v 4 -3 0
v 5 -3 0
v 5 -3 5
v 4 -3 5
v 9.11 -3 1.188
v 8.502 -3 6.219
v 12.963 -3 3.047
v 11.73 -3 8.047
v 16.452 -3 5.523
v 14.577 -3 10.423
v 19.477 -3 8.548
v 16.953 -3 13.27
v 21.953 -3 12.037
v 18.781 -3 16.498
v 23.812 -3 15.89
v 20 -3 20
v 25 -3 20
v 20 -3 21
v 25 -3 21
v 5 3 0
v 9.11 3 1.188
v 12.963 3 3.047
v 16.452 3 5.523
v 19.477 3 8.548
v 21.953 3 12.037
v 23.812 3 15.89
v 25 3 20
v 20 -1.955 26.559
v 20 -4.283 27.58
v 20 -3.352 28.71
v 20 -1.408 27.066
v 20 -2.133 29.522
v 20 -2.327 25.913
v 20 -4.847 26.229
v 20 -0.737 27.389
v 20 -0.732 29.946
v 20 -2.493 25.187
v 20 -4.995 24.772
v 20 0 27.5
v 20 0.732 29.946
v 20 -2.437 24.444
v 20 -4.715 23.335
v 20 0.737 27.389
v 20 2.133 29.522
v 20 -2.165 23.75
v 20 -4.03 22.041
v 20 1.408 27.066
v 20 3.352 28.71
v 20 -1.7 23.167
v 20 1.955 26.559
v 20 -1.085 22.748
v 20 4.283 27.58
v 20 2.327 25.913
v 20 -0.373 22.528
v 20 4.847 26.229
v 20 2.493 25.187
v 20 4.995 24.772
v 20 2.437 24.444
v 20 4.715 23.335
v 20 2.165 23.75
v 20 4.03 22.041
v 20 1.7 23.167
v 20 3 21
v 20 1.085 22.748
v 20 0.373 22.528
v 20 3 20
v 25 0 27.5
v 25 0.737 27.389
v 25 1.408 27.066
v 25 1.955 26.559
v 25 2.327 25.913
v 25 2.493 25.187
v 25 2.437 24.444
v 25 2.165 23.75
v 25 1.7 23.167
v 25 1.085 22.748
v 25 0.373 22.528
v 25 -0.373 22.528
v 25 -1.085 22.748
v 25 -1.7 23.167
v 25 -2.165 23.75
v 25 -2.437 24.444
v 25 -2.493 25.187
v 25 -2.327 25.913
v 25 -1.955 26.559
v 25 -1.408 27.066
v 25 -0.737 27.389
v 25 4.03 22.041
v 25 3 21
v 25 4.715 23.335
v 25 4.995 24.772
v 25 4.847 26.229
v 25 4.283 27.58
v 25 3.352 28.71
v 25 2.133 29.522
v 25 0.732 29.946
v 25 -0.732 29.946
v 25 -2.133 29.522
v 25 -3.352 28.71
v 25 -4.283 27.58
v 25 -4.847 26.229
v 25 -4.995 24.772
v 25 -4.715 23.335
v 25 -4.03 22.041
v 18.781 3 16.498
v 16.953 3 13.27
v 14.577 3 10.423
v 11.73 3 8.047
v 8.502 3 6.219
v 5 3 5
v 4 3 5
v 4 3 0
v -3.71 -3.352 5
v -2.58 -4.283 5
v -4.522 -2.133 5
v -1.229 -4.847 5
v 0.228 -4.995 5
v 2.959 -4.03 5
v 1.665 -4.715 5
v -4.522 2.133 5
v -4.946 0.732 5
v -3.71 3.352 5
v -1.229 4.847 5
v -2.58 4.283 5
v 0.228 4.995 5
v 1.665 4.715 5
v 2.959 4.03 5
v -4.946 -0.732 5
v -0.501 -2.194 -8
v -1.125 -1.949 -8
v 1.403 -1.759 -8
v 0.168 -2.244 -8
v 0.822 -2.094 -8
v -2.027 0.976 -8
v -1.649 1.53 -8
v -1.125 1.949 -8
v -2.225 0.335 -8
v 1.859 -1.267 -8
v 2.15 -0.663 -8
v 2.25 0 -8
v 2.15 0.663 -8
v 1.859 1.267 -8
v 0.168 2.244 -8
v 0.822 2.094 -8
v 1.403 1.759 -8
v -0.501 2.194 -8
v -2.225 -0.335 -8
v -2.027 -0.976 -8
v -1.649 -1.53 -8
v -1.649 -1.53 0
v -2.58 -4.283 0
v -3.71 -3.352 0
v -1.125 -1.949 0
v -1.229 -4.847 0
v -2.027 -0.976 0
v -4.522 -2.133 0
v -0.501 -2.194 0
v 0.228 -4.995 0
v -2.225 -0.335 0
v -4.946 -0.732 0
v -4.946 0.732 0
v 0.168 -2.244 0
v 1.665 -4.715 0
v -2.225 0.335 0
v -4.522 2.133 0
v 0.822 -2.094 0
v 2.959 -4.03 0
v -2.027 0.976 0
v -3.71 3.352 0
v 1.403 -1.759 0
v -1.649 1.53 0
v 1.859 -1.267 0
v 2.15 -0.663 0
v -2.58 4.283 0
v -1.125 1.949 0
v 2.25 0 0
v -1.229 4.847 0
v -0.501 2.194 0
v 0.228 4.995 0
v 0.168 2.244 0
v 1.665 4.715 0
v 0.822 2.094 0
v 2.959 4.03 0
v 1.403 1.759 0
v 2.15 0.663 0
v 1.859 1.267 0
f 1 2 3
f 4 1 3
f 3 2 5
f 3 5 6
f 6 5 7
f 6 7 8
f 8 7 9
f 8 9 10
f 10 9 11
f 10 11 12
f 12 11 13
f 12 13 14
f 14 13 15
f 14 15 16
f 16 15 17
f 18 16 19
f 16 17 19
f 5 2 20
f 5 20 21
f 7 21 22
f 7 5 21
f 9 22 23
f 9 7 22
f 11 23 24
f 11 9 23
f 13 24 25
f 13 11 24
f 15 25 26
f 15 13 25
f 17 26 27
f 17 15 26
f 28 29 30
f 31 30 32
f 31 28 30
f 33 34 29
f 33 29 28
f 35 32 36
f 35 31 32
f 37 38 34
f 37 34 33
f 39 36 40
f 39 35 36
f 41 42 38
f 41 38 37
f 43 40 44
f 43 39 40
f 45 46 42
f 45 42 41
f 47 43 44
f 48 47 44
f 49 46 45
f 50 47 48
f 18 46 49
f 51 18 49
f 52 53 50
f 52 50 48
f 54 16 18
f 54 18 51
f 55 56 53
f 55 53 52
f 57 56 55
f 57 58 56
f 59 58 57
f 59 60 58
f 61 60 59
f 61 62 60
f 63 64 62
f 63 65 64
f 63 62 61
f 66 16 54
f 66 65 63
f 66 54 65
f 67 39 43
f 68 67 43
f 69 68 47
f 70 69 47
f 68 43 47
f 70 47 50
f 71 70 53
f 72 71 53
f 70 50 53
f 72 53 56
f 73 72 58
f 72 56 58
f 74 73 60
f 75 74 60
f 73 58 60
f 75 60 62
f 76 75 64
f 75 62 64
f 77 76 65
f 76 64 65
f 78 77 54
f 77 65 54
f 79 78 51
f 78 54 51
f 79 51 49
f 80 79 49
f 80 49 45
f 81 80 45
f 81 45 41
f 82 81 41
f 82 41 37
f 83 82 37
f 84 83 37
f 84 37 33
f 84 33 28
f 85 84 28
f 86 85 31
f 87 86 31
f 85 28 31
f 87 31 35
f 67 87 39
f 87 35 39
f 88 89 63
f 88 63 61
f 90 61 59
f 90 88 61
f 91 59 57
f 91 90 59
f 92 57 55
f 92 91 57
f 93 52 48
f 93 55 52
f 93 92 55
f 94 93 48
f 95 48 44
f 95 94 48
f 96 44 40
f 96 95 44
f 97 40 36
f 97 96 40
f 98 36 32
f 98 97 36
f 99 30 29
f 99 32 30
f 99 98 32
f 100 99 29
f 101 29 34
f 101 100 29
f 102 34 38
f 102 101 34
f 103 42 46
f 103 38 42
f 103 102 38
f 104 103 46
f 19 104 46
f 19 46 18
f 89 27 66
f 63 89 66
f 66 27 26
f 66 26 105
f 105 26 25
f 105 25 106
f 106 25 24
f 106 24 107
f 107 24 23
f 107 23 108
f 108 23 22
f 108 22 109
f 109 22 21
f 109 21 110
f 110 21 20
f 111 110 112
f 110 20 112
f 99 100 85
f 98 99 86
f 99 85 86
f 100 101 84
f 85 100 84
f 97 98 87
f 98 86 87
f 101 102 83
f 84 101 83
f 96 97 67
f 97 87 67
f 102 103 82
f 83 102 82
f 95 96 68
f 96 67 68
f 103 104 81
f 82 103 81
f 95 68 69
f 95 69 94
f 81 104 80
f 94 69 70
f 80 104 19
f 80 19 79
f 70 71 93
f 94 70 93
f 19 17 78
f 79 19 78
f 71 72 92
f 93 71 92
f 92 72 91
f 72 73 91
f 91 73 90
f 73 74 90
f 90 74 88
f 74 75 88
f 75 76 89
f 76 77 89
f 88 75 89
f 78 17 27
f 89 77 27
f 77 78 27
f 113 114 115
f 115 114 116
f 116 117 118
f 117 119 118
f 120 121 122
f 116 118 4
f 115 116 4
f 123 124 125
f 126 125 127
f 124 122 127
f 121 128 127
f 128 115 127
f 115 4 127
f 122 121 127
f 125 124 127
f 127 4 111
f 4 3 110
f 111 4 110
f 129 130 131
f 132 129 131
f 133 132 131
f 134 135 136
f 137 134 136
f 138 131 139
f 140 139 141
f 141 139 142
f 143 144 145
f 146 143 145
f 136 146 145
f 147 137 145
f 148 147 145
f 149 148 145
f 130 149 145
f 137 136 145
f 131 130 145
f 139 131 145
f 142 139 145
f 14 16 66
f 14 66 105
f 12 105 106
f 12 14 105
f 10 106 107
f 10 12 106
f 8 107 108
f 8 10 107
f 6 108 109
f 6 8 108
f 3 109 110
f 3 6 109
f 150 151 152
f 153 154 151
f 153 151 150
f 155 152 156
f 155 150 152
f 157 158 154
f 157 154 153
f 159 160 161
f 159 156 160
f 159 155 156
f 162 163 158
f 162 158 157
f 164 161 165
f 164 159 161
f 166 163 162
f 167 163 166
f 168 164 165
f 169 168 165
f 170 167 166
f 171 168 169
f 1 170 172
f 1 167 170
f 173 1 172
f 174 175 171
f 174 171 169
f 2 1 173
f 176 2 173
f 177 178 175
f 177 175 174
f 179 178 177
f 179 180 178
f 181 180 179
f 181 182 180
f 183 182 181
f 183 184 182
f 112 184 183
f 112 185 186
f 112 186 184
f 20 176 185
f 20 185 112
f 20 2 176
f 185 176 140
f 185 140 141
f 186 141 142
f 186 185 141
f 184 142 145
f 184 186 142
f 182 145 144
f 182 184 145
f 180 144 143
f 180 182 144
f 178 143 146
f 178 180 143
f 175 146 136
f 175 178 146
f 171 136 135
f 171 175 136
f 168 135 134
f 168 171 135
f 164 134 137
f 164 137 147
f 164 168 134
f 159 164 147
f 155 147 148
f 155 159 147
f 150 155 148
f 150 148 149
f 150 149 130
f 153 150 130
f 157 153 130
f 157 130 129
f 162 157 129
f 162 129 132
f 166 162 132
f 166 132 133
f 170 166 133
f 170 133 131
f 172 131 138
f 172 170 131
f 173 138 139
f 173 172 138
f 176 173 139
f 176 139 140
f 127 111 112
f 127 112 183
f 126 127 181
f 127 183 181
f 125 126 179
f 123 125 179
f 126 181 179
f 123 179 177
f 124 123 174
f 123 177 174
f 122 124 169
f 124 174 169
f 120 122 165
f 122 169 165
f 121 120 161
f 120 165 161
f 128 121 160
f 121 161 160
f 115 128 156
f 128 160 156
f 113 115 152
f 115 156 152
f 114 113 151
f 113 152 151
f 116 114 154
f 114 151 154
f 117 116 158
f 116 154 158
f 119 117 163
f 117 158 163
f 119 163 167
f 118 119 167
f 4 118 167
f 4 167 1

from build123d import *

# Parameters (mm, degrees)
SKETCH_2_R           = 5
EXTRUDE_3_DEPTH      = 5
EXTRUDE_4_DEPTH      = 3
EXTRUDE_4_DEPTH_BACK = 3
SKETCH_3_3_W         = 5
SKETCH_3_3_H         = 5
SKETCH_4_W           = 5
SKETCH_4_H           = 6
EXTRUDE_5_DEPTH      = 3
SKETCH_5_W           = 5
SKETCH_5_H           = 6
EXTRUDE_6_DEPTH      = 3
SKETCH_6_R           = 2.5
CUT_EXTRUDE_1_DEPTH  = 5
EXTRUDE_START        = -5
SKETCH_7_R           = 2.25
EXTRUDE_7_DEPTH      = 8


with BuildPart() as part:
    # 草图2 → 凸台-拉伸3 (new body)
    with BuildSketch(Plane.XY):
        Circle(SKETCH_2_R)
    extrude(amount=EXTRUDE_3_DEPTH)



with BuildPart() as body_2:
    # 草图3 → 凸台-拉伸4 (new, two sides: drawn at the far end of the back side and taken through both)
    with BuildSketch(Plane(origin=(0, 0, 0), x_dir=(1, 0, 0), z_dir=(0, 1, 0)).offset(-EXTRUDE_4_DEPTH_BACK)):
        with BuildLine():
            ThreePointArc((5, 0), (18.027756377, -6.972243623), (25, -20))
            Line((25, -20), (20, -20))
            ThreePointArc((20, -20), (14.577379737, -10.422620263), (5, -5))
            Line((5, -5), (5, 0))
        make_face()
    extrude(amount=EXTRUDE_4_DEPTH + EXTRUDE_4_DEPTH_BACK)



with BuildPart() as body_3:
    # 草图3<3> → 旋转1 (revolve)
    with BuildSketch(Plane(origin=(0, 0, 0), x_dir=(1, 0, 0), z_dir=(0, 1, 0)), mode=Mode.PRIVATE) as revolve_1_sk:
        with Locations((22.5, -22.5)):
            Rectangle(SKETCH_3_3_W, SKETCH_3_3_H)
    revolve(revolve_1_sk.sketch.rotate(Axis((0, 0, 25), (1, 0, 0)), 180), axis=Axis((0, 0, 25), (1, 0, 0)))


with BuildPart() as body_2_1:
    add(body_2.part)

    add(body_3.part)  # 凸台-拉伸5 merges body 3
    # 草图4 → 凸台-拉伸5 (add)
    with BuildSketch(Plane.XY.offset(20)):
        with Locations((22.5, 0)):
            Rectangle(SKETCH_4_W, SKETCH_4_H)
    extrude(amount=EXTRUDE_5_DEPTH)


with BuildPart() as part_1:
    add(part.part)

    add(body_2_1.part)  # 凸台-拉伸6 merges body 2
    # 草图5 → 凸台-拉伸6 (add)
    with BuildSketch(Plane.ZY.offset(-5)):
        with Locations((2.5, 0)):
            Rectangle(SKETCH_5_W, SKETCH_5_H)
    extrude(amount=EXTRUDE_6_DEPTH)

    # 草图6 → 切除-拉伸1 (cut)
    with BuildSketch(Plane.ZY.offset(-20)):
        with Locations((25, 0)):
            Circle(SKETCH_6_R)
    extrude(amount=-CUT_EXTRUDE_1_DEPTH, mode=Mode.SUBTRACT)

    # 草图7 → 凸台-拉伸7 (add)
    with BuildSketch(Plane.XY.offset(5).offset(EXTRUDE_START)):
        Circle(SKETCH_7_R)
    extrude(amount=-EXTRUDE_7_DEPTH)


solid = part_1.part
